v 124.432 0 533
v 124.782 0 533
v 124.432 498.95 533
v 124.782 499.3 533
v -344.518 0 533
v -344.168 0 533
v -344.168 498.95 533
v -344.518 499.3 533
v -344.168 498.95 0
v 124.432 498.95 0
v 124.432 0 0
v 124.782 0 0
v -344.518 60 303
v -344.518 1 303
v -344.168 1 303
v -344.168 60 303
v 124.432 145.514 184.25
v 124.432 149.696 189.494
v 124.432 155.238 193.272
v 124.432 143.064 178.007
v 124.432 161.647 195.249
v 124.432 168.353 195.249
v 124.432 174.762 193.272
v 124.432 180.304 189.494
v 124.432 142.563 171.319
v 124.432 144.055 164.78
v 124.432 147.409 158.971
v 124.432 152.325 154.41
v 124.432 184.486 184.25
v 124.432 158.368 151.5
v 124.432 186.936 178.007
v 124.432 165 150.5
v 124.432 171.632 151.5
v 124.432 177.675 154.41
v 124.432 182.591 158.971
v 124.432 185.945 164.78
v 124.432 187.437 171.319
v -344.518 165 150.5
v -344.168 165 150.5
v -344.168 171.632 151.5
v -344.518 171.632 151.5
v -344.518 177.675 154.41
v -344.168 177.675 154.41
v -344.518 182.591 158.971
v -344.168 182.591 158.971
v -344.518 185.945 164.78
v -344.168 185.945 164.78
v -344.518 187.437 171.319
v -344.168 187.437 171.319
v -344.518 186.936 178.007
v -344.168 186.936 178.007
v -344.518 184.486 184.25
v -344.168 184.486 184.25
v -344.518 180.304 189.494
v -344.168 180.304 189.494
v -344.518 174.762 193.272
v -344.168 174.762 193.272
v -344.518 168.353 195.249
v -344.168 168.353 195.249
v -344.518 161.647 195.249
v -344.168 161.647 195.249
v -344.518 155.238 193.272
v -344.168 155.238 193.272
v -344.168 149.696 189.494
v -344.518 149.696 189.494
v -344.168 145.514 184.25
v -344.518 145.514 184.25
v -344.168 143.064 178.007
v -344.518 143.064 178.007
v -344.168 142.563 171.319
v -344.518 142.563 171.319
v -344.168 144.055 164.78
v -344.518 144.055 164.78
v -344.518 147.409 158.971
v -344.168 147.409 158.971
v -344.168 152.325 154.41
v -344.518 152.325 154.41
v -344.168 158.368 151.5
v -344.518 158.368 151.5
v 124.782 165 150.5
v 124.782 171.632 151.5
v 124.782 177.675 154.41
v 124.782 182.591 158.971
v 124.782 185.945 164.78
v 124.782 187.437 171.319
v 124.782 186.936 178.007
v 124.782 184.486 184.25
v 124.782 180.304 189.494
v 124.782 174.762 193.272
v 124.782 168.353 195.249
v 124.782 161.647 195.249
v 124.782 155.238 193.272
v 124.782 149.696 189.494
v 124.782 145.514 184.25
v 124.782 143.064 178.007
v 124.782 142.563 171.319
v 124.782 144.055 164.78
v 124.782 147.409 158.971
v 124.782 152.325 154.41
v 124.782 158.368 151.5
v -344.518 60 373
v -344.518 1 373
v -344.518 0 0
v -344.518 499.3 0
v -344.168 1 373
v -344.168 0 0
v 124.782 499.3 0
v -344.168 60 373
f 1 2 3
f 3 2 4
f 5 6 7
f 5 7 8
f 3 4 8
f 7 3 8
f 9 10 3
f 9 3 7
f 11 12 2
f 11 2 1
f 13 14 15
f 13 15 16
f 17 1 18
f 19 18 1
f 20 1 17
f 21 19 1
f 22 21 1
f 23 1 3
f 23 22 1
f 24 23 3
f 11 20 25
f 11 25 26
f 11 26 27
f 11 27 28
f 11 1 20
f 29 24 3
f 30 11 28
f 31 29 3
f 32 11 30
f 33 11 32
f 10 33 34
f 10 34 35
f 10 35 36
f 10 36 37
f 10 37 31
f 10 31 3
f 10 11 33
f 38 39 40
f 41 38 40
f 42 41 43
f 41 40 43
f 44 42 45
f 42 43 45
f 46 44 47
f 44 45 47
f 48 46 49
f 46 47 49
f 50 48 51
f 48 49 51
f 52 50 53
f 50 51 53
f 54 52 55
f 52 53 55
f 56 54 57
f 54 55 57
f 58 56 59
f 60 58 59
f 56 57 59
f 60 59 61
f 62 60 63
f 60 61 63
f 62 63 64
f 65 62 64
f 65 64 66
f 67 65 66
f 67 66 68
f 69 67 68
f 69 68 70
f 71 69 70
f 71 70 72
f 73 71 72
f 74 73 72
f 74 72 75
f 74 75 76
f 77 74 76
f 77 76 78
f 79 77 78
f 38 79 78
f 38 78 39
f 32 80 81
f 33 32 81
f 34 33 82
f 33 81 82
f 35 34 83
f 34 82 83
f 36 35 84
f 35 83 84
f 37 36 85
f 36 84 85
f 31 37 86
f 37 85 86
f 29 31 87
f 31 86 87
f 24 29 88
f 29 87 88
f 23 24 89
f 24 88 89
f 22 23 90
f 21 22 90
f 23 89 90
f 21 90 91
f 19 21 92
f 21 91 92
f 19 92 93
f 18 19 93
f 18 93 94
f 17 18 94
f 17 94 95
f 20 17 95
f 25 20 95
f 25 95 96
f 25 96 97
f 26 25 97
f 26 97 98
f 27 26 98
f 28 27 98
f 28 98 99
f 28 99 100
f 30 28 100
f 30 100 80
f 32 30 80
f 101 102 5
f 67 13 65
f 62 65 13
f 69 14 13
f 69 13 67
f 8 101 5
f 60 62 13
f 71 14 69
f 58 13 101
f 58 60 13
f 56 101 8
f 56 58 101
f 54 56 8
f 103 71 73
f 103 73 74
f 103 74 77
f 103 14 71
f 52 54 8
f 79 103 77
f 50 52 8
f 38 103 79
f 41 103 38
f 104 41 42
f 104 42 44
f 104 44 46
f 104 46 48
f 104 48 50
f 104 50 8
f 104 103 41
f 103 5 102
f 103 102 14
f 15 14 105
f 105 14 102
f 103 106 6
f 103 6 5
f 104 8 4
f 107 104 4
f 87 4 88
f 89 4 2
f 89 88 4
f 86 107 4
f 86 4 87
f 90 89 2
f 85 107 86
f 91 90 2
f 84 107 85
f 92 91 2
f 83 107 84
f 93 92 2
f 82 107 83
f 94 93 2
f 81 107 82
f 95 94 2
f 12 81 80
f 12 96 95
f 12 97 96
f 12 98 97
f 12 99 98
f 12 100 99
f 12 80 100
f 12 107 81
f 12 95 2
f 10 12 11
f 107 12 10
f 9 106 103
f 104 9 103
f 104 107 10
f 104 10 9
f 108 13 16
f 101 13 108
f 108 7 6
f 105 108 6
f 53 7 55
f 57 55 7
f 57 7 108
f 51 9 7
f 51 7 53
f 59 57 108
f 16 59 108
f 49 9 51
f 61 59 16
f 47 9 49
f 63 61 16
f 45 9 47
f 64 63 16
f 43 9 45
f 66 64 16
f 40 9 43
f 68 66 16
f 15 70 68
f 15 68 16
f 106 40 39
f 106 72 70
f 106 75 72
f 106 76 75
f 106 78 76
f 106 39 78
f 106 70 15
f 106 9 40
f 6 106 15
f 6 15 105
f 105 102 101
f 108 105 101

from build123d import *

# Parameters (mm, degrees)
BOSS_EXTRUDE1_DEPTH = 533
SKETCH2_R           = 22.5
CUT_EXTRUDE1_DEPTH  = 533
SKETCH3_W           = 70
SKETCH3_H           = 59
CUT_EXTRUDE2_DEPTH  = 243


with BuildPart() as part:
    # Sketch1 → Boss-Extrude1 (new body)
    with BuildSketch(Plane.XY):
        Polygon((-344.517995001, 0), (-344.517995001, 499.3), (124.782004999, 499.3), (124.782004999, 0), (124.432004999, 0), (124.432004999, 498.95), (-344.167995001, 498.95), (-344.167995001, 0), align=None)
    extrude(amount=BOSS_EXTRUDE1_DEPTH)

    # Sketch2 → Cut-Extrude1 (cut)
    with BuildSketch(Plane(origin=(124.782004999, 0, 0), x_dir=(0, 0, -1), z_dir=(1, 0, 0))):
        with Locations((-173, 165)):
            Circle(SKETCH2_R)
    extrude(amount=-CUT_EXTRUDE1_DEPTH, mode=Mode.SUBTRACT)

    # Sketch3 → Cut-Extrude2 (cut)
    with BuildSketch(Plane.ZY.offset(344.517995001)):
        with Locations((338, 30.5)):
            Rectangle(SKETCH3_W, SKETCH3_H)
    extrude(amount=-CUT_EXTRUDE2_DEPTH, mode=Mode.SUBTRACT)


solid = part.part
